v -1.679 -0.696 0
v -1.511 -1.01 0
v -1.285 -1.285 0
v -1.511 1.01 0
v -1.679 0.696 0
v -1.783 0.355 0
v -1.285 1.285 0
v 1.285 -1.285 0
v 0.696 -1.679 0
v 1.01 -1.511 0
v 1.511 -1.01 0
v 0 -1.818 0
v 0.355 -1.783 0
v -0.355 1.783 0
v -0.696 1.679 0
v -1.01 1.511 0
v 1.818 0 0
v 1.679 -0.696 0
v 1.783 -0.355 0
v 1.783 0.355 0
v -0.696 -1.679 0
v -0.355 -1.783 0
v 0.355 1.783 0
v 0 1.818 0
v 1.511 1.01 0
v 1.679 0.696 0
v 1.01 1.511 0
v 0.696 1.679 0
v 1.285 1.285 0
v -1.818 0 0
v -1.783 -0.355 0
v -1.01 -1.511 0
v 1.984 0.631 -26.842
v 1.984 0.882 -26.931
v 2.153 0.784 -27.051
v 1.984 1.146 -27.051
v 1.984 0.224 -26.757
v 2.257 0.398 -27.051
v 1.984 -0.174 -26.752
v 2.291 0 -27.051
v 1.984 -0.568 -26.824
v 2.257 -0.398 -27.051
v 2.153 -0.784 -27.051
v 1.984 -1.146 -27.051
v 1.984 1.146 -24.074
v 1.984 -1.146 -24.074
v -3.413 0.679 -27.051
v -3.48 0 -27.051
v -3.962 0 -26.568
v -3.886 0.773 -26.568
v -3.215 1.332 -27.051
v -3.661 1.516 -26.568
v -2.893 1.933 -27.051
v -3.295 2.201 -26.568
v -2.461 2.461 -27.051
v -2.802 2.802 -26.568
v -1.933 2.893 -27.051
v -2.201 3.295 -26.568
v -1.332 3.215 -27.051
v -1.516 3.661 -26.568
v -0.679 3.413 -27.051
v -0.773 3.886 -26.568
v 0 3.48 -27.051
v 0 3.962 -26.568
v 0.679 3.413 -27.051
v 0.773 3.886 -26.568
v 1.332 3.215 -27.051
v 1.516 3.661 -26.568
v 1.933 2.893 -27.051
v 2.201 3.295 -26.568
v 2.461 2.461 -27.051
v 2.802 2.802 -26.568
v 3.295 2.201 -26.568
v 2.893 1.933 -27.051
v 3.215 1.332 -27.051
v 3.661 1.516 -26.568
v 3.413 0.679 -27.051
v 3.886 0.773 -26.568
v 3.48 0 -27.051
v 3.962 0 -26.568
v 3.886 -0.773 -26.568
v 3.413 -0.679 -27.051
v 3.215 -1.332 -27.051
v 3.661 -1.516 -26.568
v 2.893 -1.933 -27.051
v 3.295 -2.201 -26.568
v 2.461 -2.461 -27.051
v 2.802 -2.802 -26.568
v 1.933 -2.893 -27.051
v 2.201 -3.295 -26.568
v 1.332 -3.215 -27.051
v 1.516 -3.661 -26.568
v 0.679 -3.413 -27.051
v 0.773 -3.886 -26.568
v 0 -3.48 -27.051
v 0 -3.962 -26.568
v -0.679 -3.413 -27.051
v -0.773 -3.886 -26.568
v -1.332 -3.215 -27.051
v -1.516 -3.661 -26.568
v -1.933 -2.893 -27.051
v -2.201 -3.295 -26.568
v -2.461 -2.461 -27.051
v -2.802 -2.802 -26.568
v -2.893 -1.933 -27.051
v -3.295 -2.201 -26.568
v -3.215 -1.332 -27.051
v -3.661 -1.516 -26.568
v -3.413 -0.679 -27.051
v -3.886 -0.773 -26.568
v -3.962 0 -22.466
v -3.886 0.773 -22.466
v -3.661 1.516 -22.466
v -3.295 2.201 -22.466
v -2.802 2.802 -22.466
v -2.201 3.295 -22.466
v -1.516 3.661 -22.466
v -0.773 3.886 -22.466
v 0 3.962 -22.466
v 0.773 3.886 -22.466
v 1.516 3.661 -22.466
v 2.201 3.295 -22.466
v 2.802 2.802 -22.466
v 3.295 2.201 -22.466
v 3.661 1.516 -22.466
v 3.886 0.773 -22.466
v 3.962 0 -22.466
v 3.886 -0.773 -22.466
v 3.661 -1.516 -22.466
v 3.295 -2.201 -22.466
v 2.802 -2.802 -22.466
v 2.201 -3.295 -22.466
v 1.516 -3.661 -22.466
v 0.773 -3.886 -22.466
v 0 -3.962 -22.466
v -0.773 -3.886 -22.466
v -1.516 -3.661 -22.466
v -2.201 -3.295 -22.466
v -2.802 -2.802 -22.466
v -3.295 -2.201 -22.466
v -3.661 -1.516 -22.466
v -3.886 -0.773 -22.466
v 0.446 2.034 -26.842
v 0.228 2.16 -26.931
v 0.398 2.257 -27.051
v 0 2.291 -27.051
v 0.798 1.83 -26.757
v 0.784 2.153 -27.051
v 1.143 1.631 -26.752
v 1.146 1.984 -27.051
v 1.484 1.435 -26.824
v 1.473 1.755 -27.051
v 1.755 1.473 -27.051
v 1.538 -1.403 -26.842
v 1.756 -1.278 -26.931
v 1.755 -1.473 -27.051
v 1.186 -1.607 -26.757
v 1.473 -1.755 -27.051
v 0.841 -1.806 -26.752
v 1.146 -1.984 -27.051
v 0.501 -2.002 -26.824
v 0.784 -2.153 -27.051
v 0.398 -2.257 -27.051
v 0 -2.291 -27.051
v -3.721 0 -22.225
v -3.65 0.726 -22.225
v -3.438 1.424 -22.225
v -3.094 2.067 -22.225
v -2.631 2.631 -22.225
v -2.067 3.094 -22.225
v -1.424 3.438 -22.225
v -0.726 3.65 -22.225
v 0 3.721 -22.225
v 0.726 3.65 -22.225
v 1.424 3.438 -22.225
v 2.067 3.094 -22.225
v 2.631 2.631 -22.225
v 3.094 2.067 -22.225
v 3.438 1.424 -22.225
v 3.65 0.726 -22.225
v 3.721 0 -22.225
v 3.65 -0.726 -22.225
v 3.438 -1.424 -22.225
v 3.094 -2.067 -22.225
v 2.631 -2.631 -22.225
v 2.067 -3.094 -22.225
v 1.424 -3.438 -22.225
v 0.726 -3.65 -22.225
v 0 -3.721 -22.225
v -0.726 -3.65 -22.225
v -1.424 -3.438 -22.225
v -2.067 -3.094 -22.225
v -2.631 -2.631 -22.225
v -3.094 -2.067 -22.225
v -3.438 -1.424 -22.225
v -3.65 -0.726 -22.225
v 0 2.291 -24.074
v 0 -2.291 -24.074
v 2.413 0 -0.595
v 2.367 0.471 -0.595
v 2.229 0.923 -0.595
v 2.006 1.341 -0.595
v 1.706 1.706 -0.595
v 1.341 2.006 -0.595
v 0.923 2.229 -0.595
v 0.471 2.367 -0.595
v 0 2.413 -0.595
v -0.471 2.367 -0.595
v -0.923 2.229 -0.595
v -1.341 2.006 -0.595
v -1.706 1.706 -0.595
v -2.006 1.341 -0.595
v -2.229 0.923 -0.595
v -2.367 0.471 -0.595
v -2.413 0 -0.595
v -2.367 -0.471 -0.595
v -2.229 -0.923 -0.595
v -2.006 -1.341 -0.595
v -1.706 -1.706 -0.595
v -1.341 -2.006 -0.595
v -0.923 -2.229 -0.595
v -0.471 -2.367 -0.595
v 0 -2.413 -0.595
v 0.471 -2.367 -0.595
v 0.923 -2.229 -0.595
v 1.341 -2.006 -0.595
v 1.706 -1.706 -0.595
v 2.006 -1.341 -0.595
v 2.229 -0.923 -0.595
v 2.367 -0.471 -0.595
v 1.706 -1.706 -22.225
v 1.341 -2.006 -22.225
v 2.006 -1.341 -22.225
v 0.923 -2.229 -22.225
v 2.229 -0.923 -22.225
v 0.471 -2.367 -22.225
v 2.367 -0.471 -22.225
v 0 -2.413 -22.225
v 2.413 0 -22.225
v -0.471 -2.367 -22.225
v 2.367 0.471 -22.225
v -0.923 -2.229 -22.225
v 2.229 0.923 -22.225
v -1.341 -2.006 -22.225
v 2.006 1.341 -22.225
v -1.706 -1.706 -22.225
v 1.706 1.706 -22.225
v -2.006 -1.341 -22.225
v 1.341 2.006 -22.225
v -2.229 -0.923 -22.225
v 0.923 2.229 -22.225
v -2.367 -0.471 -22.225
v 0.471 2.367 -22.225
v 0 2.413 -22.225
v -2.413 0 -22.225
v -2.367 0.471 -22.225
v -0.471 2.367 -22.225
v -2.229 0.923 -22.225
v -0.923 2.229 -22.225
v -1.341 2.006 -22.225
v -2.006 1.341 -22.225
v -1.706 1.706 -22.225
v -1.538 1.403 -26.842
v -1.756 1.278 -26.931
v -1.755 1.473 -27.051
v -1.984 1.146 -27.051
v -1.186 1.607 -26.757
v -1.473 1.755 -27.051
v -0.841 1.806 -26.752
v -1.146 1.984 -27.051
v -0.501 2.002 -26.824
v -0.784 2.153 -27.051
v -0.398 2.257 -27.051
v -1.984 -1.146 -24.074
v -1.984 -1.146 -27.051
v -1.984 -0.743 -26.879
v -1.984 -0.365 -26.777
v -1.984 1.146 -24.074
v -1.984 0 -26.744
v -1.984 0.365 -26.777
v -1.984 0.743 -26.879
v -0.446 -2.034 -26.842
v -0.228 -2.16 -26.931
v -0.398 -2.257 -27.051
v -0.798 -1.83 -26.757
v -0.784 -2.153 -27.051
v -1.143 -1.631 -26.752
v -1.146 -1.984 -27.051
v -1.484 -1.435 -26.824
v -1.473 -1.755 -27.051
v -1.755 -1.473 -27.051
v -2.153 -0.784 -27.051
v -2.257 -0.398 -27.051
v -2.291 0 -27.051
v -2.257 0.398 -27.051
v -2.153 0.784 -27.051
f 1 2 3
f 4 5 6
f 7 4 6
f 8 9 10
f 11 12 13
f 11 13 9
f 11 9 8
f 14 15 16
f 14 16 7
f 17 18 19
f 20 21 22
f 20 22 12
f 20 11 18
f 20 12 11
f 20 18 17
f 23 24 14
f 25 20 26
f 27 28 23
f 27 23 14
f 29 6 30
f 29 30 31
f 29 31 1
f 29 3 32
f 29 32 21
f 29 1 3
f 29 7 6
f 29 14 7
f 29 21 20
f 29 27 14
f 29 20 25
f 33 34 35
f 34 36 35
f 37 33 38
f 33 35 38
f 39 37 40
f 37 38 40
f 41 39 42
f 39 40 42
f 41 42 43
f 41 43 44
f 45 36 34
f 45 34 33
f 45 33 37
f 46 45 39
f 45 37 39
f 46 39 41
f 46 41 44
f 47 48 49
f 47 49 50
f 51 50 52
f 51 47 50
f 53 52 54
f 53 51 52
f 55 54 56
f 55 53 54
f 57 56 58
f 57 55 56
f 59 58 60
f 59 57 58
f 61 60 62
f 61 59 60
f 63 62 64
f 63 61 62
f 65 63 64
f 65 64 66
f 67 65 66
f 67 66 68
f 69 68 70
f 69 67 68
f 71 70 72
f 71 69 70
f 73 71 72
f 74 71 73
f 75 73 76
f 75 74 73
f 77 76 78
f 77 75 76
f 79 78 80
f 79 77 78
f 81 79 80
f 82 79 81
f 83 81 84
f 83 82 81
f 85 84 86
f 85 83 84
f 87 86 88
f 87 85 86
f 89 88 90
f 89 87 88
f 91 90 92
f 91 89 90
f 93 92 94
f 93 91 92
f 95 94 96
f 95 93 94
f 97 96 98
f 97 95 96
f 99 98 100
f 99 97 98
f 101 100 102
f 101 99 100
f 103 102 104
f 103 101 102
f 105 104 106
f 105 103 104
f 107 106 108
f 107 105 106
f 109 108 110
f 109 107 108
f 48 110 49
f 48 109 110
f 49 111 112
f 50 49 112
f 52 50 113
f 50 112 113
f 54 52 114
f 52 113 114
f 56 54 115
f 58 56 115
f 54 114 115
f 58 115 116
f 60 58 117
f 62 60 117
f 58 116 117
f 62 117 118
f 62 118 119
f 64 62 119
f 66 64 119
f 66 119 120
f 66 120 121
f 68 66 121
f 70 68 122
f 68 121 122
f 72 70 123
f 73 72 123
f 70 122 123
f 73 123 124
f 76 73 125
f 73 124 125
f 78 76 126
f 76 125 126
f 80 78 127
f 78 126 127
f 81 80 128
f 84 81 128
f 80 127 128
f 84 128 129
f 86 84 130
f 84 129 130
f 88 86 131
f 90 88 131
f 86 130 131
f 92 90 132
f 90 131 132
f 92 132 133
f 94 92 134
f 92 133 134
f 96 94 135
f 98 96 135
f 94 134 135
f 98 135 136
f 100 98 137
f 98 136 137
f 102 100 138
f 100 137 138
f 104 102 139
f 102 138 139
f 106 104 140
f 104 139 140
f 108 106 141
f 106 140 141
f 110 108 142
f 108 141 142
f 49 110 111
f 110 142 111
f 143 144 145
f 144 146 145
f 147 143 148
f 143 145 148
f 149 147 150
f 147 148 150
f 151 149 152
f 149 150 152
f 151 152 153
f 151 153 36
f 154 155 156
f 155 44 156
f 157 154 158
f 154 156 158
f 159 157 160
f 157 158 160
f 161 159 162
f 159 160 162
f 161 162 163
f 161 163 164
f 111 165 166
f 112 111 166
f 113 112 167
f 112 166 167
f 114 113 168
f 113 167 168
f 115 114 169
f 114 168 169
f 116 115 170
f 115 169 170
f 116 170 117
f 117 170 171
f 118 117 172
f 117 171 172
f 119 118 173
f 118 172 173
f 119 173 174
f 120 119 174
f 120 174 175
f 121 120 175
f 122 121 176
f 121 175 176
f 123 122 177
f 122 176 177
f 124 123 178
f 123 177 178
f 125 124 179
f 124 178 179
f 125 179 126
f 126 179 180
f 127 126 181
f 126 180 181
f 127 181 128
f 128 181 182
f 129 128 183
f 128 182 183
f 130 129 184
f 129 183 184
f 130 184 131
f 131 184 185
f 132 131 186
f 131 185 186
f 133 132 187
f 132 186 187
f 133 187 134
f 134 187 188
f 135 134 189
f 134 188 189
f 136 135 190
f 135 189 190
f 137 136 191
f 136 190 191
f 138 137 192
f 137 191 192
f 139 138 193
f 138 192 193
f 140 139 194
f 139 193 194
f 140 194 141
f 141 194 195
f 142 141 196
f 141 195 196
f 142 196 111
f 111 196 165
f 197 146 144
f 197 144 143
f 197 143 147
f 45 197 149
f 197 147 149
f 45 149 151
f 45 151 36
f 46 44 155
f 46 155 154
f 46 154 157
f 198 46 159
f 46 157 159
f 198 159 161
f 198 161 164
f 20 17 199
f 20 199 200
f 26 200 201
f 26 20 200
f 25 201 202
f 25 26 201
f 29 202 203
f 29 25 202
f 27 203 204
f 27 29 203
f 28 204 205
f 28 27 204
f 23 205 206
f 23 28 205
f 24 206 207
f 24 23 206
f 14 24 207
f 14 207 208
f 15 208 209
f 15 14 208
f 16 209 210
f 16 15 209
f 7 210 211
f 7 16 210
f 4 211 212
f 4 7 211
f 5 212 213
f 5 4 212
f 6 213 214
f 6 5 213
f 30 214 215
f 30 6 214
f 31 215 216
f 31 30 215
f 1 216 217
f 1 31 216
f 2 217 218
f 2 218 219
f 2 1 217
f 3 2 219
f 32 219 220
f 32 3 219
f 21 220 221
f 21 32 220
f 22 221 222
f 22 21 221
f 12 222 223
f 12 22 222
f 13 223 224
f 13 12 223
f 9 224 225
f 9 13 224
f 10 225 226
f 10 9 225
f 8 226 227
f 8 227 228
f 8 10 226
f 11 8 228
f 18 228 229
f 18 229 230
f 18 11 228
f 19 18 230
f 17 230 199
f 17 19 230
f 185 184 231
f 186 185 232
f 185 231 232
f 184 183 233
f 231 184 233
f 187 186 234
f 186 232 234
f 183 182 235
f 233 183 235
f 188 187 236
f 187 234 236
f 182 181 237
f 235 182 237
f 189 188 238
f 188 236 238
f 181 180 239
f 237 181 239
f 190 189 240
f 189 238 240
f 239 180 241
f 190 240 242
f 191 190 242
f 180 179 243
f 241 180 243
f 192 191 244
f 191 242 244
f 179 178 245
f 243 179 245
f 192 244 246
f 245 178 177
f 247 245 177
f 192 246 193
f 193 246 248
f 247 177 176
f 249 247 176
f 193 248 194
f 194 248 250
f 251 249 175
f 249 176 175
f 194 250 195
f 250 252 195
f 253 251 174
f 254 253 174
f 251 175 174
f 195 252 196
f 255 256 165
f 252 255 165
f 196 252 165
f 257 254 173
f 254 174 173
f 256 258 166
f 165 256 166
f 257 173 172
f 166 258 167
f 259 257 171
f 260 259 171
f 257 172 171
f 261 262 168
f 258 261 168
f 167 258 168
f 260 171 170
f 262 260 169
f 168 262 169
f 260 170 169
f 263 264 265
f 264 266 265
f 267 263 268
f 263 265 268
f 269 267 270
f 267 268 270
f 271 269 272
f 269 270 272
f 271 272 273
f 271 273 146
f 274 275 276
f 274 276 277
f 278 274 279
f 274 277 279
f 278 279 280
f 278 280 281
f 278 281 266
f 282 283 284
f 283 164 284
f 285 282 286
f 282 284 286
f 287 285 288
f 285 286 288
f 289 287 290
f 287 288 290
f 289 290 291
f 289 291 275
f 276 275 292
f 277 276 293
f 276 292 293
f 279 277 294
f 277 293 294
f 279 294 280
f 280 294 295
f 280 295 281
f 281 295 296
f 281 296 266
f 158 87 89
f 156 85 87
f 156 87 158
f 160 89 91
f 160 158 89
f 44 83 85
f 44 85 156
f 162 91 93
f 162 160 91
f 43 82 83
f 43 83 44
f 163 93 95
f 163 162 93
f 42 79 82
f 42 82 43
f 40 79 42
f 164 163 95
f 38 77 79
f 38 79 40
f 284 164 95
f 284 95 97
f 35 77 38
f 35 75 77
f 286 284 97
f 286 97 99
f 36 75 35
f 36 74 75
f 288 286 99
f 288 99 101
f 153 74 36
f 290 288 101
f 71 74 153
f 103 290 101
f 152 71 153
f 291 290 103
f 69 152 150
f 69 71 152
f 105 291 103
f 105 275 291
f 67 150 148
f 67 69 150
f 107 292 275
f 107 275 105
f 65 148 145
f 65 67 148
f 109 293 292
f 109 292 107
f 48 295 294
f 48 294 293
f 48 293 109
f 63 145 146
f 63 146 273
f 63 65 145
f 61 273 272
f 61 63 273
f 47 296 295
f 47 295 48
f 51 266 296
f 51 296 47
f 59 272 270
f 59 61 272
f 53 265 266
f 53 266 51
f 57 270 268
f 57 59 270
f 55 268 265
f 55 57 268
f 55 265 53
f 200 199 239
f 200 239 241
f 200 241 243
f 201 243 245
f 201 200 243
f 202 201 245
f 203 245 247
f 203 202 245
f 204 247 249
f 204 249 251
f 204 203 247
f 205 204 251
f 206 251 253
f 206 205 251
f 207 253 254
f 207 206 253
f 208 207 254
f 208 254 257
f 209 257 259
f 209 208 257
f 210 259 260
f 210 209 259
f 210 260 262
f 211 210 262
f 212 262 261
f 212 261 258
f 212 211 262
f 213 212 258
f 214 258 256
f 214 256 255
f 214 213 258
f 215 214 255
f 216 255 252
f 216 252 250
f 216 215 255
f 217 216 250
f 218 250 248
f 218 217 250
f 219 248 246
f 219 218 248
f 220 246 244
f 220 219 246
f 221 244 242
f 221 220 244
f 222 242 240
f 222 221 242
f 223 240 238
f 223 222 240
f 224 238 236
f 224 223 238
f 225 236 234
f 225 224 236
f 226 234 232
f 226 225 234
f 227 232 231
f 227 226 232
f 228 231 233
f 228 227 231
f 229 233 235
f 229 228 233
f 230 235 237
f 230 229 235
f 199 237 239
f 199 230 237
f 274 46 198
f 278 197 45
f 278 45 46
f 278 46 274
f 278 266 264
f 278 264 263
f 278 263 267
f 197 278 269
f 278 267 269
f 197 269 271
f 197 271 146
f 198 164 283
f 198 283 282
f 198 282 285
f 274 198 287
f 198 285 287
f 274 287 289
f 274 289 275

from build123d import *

# Parameters (mm, degrees)
SKETCH1_R          = 2.413
EXTRUDE1_DEPTH     = 22.225
CHAMFER3_SIZE      = 0.5953125
SKETCH6_R          = 3.9624
EXTRUDE2_DEPTH     = 4.826
CUT_EXTRUDE1_DEPTH = 2.9765625
SKETCH8_R          = 2.291358881
CUT_EXTRUDE2_DEPTH = 0.4826
CUT_EXTRUDE2_DRAFT = -45
CHAMFER1_SIZE      = 0.4826
CHAMFER2_SIZE      = 0.2413


with BuildPart() as part:
    # Sketch1 → Extrude1 (new body)
    with BuildSketch(Plane.XY):
        Circle(SKETCH1_R)
    extrude(amount=-EXTRUDE1_DEPTH)

    # Chamfer3
    chamfer3_edges = [part.edges().sort_by_distance(p)[0] for p in [
        (-2.413, 0, 0),
    ]]
    chamfer(chamfer3_edges, length=CHAMFER3_SIZE)

    # Sketch6 → Extrude2 (add)
    with BuildSketch(Plane(origin=(0, 0, -22.225), x_dir=(-1, 0, 0), z_dir=(0, 0, -1))):
        Circle(SKETCH6_R)
    extrude(amount=EXTRUDE2_DEPTH)

    # Sketch7 → Cut-Extrude1 (cut)
    with BuildSketch(Plane(origin=(0, 0, -27.051), x_dir=(-1, 0, 0), z_dir=(0, 0, -1))):
        Polygon((0, 2.291358881), (-1.984375, 1.14567944), (-1.984375, -1.14567944), (0, -2.291358881), (1.984375, -1.14567944), (1.984375, 1.14567944), align=None)
    extrude(amount=-CUT_EXTRUDE1_DEPTH, mode=Mode.SUBTRACT)


with BuildPart() as cut_extrude2_tool:
    # Sketch8 → Cut-Extrude2 (with draft: the straight prism first)
    with BuildSketch(Plane(origin=(0, 0, -27.051), x_dir=(-1, 0, 0), z_dir=(0, 0, -1))):
        Circle(SKETCH8_R)
    extrude(amount=-CUT_EXTRUDE2_DEPTH)
    # Cut-Extrude2: the draft: its side faces are tilted about the plane it starts from
    cut_extrude2_sides = [cut_extrude2_tool.faces().sort_by_distance(p)[0] for p in [
        (2.291358881, 0, -26.8097),
    ]]
    draft(cut_extrude2_sides, Plane(origin=(0, 0, -27.051), x_dir=(-1, 0, 0), z_dir=(0, 0, -1)), CUT_EXTRUDE2_DRAFT)


with BuildPart() as part_1:
    add(part.part)

    # Cut-Extrude2: cut by cut_extrude2_tool
    add(cut_extrude2_tool.part, mode=Mode.SUBTRACT)

    # Chamfer1
    chamfer1_edges = [part_1.edges().sort_by_distance(p)[0] for p in [
        (3.9624, 0, -27.051),
    ]]
    chamfer(chamfer1_edges, length=CHAMFER1_SIZE)

    # Chamfer2
    chamfer2_edges = [part_1.edges().sort_by_distance(p)[0] for p in [
        (3.9624, 0, -22.225),
    ]]
    chamfer(chamfer2_edges, length=CHAMFER2_SIZE)


solid = part_1.part
